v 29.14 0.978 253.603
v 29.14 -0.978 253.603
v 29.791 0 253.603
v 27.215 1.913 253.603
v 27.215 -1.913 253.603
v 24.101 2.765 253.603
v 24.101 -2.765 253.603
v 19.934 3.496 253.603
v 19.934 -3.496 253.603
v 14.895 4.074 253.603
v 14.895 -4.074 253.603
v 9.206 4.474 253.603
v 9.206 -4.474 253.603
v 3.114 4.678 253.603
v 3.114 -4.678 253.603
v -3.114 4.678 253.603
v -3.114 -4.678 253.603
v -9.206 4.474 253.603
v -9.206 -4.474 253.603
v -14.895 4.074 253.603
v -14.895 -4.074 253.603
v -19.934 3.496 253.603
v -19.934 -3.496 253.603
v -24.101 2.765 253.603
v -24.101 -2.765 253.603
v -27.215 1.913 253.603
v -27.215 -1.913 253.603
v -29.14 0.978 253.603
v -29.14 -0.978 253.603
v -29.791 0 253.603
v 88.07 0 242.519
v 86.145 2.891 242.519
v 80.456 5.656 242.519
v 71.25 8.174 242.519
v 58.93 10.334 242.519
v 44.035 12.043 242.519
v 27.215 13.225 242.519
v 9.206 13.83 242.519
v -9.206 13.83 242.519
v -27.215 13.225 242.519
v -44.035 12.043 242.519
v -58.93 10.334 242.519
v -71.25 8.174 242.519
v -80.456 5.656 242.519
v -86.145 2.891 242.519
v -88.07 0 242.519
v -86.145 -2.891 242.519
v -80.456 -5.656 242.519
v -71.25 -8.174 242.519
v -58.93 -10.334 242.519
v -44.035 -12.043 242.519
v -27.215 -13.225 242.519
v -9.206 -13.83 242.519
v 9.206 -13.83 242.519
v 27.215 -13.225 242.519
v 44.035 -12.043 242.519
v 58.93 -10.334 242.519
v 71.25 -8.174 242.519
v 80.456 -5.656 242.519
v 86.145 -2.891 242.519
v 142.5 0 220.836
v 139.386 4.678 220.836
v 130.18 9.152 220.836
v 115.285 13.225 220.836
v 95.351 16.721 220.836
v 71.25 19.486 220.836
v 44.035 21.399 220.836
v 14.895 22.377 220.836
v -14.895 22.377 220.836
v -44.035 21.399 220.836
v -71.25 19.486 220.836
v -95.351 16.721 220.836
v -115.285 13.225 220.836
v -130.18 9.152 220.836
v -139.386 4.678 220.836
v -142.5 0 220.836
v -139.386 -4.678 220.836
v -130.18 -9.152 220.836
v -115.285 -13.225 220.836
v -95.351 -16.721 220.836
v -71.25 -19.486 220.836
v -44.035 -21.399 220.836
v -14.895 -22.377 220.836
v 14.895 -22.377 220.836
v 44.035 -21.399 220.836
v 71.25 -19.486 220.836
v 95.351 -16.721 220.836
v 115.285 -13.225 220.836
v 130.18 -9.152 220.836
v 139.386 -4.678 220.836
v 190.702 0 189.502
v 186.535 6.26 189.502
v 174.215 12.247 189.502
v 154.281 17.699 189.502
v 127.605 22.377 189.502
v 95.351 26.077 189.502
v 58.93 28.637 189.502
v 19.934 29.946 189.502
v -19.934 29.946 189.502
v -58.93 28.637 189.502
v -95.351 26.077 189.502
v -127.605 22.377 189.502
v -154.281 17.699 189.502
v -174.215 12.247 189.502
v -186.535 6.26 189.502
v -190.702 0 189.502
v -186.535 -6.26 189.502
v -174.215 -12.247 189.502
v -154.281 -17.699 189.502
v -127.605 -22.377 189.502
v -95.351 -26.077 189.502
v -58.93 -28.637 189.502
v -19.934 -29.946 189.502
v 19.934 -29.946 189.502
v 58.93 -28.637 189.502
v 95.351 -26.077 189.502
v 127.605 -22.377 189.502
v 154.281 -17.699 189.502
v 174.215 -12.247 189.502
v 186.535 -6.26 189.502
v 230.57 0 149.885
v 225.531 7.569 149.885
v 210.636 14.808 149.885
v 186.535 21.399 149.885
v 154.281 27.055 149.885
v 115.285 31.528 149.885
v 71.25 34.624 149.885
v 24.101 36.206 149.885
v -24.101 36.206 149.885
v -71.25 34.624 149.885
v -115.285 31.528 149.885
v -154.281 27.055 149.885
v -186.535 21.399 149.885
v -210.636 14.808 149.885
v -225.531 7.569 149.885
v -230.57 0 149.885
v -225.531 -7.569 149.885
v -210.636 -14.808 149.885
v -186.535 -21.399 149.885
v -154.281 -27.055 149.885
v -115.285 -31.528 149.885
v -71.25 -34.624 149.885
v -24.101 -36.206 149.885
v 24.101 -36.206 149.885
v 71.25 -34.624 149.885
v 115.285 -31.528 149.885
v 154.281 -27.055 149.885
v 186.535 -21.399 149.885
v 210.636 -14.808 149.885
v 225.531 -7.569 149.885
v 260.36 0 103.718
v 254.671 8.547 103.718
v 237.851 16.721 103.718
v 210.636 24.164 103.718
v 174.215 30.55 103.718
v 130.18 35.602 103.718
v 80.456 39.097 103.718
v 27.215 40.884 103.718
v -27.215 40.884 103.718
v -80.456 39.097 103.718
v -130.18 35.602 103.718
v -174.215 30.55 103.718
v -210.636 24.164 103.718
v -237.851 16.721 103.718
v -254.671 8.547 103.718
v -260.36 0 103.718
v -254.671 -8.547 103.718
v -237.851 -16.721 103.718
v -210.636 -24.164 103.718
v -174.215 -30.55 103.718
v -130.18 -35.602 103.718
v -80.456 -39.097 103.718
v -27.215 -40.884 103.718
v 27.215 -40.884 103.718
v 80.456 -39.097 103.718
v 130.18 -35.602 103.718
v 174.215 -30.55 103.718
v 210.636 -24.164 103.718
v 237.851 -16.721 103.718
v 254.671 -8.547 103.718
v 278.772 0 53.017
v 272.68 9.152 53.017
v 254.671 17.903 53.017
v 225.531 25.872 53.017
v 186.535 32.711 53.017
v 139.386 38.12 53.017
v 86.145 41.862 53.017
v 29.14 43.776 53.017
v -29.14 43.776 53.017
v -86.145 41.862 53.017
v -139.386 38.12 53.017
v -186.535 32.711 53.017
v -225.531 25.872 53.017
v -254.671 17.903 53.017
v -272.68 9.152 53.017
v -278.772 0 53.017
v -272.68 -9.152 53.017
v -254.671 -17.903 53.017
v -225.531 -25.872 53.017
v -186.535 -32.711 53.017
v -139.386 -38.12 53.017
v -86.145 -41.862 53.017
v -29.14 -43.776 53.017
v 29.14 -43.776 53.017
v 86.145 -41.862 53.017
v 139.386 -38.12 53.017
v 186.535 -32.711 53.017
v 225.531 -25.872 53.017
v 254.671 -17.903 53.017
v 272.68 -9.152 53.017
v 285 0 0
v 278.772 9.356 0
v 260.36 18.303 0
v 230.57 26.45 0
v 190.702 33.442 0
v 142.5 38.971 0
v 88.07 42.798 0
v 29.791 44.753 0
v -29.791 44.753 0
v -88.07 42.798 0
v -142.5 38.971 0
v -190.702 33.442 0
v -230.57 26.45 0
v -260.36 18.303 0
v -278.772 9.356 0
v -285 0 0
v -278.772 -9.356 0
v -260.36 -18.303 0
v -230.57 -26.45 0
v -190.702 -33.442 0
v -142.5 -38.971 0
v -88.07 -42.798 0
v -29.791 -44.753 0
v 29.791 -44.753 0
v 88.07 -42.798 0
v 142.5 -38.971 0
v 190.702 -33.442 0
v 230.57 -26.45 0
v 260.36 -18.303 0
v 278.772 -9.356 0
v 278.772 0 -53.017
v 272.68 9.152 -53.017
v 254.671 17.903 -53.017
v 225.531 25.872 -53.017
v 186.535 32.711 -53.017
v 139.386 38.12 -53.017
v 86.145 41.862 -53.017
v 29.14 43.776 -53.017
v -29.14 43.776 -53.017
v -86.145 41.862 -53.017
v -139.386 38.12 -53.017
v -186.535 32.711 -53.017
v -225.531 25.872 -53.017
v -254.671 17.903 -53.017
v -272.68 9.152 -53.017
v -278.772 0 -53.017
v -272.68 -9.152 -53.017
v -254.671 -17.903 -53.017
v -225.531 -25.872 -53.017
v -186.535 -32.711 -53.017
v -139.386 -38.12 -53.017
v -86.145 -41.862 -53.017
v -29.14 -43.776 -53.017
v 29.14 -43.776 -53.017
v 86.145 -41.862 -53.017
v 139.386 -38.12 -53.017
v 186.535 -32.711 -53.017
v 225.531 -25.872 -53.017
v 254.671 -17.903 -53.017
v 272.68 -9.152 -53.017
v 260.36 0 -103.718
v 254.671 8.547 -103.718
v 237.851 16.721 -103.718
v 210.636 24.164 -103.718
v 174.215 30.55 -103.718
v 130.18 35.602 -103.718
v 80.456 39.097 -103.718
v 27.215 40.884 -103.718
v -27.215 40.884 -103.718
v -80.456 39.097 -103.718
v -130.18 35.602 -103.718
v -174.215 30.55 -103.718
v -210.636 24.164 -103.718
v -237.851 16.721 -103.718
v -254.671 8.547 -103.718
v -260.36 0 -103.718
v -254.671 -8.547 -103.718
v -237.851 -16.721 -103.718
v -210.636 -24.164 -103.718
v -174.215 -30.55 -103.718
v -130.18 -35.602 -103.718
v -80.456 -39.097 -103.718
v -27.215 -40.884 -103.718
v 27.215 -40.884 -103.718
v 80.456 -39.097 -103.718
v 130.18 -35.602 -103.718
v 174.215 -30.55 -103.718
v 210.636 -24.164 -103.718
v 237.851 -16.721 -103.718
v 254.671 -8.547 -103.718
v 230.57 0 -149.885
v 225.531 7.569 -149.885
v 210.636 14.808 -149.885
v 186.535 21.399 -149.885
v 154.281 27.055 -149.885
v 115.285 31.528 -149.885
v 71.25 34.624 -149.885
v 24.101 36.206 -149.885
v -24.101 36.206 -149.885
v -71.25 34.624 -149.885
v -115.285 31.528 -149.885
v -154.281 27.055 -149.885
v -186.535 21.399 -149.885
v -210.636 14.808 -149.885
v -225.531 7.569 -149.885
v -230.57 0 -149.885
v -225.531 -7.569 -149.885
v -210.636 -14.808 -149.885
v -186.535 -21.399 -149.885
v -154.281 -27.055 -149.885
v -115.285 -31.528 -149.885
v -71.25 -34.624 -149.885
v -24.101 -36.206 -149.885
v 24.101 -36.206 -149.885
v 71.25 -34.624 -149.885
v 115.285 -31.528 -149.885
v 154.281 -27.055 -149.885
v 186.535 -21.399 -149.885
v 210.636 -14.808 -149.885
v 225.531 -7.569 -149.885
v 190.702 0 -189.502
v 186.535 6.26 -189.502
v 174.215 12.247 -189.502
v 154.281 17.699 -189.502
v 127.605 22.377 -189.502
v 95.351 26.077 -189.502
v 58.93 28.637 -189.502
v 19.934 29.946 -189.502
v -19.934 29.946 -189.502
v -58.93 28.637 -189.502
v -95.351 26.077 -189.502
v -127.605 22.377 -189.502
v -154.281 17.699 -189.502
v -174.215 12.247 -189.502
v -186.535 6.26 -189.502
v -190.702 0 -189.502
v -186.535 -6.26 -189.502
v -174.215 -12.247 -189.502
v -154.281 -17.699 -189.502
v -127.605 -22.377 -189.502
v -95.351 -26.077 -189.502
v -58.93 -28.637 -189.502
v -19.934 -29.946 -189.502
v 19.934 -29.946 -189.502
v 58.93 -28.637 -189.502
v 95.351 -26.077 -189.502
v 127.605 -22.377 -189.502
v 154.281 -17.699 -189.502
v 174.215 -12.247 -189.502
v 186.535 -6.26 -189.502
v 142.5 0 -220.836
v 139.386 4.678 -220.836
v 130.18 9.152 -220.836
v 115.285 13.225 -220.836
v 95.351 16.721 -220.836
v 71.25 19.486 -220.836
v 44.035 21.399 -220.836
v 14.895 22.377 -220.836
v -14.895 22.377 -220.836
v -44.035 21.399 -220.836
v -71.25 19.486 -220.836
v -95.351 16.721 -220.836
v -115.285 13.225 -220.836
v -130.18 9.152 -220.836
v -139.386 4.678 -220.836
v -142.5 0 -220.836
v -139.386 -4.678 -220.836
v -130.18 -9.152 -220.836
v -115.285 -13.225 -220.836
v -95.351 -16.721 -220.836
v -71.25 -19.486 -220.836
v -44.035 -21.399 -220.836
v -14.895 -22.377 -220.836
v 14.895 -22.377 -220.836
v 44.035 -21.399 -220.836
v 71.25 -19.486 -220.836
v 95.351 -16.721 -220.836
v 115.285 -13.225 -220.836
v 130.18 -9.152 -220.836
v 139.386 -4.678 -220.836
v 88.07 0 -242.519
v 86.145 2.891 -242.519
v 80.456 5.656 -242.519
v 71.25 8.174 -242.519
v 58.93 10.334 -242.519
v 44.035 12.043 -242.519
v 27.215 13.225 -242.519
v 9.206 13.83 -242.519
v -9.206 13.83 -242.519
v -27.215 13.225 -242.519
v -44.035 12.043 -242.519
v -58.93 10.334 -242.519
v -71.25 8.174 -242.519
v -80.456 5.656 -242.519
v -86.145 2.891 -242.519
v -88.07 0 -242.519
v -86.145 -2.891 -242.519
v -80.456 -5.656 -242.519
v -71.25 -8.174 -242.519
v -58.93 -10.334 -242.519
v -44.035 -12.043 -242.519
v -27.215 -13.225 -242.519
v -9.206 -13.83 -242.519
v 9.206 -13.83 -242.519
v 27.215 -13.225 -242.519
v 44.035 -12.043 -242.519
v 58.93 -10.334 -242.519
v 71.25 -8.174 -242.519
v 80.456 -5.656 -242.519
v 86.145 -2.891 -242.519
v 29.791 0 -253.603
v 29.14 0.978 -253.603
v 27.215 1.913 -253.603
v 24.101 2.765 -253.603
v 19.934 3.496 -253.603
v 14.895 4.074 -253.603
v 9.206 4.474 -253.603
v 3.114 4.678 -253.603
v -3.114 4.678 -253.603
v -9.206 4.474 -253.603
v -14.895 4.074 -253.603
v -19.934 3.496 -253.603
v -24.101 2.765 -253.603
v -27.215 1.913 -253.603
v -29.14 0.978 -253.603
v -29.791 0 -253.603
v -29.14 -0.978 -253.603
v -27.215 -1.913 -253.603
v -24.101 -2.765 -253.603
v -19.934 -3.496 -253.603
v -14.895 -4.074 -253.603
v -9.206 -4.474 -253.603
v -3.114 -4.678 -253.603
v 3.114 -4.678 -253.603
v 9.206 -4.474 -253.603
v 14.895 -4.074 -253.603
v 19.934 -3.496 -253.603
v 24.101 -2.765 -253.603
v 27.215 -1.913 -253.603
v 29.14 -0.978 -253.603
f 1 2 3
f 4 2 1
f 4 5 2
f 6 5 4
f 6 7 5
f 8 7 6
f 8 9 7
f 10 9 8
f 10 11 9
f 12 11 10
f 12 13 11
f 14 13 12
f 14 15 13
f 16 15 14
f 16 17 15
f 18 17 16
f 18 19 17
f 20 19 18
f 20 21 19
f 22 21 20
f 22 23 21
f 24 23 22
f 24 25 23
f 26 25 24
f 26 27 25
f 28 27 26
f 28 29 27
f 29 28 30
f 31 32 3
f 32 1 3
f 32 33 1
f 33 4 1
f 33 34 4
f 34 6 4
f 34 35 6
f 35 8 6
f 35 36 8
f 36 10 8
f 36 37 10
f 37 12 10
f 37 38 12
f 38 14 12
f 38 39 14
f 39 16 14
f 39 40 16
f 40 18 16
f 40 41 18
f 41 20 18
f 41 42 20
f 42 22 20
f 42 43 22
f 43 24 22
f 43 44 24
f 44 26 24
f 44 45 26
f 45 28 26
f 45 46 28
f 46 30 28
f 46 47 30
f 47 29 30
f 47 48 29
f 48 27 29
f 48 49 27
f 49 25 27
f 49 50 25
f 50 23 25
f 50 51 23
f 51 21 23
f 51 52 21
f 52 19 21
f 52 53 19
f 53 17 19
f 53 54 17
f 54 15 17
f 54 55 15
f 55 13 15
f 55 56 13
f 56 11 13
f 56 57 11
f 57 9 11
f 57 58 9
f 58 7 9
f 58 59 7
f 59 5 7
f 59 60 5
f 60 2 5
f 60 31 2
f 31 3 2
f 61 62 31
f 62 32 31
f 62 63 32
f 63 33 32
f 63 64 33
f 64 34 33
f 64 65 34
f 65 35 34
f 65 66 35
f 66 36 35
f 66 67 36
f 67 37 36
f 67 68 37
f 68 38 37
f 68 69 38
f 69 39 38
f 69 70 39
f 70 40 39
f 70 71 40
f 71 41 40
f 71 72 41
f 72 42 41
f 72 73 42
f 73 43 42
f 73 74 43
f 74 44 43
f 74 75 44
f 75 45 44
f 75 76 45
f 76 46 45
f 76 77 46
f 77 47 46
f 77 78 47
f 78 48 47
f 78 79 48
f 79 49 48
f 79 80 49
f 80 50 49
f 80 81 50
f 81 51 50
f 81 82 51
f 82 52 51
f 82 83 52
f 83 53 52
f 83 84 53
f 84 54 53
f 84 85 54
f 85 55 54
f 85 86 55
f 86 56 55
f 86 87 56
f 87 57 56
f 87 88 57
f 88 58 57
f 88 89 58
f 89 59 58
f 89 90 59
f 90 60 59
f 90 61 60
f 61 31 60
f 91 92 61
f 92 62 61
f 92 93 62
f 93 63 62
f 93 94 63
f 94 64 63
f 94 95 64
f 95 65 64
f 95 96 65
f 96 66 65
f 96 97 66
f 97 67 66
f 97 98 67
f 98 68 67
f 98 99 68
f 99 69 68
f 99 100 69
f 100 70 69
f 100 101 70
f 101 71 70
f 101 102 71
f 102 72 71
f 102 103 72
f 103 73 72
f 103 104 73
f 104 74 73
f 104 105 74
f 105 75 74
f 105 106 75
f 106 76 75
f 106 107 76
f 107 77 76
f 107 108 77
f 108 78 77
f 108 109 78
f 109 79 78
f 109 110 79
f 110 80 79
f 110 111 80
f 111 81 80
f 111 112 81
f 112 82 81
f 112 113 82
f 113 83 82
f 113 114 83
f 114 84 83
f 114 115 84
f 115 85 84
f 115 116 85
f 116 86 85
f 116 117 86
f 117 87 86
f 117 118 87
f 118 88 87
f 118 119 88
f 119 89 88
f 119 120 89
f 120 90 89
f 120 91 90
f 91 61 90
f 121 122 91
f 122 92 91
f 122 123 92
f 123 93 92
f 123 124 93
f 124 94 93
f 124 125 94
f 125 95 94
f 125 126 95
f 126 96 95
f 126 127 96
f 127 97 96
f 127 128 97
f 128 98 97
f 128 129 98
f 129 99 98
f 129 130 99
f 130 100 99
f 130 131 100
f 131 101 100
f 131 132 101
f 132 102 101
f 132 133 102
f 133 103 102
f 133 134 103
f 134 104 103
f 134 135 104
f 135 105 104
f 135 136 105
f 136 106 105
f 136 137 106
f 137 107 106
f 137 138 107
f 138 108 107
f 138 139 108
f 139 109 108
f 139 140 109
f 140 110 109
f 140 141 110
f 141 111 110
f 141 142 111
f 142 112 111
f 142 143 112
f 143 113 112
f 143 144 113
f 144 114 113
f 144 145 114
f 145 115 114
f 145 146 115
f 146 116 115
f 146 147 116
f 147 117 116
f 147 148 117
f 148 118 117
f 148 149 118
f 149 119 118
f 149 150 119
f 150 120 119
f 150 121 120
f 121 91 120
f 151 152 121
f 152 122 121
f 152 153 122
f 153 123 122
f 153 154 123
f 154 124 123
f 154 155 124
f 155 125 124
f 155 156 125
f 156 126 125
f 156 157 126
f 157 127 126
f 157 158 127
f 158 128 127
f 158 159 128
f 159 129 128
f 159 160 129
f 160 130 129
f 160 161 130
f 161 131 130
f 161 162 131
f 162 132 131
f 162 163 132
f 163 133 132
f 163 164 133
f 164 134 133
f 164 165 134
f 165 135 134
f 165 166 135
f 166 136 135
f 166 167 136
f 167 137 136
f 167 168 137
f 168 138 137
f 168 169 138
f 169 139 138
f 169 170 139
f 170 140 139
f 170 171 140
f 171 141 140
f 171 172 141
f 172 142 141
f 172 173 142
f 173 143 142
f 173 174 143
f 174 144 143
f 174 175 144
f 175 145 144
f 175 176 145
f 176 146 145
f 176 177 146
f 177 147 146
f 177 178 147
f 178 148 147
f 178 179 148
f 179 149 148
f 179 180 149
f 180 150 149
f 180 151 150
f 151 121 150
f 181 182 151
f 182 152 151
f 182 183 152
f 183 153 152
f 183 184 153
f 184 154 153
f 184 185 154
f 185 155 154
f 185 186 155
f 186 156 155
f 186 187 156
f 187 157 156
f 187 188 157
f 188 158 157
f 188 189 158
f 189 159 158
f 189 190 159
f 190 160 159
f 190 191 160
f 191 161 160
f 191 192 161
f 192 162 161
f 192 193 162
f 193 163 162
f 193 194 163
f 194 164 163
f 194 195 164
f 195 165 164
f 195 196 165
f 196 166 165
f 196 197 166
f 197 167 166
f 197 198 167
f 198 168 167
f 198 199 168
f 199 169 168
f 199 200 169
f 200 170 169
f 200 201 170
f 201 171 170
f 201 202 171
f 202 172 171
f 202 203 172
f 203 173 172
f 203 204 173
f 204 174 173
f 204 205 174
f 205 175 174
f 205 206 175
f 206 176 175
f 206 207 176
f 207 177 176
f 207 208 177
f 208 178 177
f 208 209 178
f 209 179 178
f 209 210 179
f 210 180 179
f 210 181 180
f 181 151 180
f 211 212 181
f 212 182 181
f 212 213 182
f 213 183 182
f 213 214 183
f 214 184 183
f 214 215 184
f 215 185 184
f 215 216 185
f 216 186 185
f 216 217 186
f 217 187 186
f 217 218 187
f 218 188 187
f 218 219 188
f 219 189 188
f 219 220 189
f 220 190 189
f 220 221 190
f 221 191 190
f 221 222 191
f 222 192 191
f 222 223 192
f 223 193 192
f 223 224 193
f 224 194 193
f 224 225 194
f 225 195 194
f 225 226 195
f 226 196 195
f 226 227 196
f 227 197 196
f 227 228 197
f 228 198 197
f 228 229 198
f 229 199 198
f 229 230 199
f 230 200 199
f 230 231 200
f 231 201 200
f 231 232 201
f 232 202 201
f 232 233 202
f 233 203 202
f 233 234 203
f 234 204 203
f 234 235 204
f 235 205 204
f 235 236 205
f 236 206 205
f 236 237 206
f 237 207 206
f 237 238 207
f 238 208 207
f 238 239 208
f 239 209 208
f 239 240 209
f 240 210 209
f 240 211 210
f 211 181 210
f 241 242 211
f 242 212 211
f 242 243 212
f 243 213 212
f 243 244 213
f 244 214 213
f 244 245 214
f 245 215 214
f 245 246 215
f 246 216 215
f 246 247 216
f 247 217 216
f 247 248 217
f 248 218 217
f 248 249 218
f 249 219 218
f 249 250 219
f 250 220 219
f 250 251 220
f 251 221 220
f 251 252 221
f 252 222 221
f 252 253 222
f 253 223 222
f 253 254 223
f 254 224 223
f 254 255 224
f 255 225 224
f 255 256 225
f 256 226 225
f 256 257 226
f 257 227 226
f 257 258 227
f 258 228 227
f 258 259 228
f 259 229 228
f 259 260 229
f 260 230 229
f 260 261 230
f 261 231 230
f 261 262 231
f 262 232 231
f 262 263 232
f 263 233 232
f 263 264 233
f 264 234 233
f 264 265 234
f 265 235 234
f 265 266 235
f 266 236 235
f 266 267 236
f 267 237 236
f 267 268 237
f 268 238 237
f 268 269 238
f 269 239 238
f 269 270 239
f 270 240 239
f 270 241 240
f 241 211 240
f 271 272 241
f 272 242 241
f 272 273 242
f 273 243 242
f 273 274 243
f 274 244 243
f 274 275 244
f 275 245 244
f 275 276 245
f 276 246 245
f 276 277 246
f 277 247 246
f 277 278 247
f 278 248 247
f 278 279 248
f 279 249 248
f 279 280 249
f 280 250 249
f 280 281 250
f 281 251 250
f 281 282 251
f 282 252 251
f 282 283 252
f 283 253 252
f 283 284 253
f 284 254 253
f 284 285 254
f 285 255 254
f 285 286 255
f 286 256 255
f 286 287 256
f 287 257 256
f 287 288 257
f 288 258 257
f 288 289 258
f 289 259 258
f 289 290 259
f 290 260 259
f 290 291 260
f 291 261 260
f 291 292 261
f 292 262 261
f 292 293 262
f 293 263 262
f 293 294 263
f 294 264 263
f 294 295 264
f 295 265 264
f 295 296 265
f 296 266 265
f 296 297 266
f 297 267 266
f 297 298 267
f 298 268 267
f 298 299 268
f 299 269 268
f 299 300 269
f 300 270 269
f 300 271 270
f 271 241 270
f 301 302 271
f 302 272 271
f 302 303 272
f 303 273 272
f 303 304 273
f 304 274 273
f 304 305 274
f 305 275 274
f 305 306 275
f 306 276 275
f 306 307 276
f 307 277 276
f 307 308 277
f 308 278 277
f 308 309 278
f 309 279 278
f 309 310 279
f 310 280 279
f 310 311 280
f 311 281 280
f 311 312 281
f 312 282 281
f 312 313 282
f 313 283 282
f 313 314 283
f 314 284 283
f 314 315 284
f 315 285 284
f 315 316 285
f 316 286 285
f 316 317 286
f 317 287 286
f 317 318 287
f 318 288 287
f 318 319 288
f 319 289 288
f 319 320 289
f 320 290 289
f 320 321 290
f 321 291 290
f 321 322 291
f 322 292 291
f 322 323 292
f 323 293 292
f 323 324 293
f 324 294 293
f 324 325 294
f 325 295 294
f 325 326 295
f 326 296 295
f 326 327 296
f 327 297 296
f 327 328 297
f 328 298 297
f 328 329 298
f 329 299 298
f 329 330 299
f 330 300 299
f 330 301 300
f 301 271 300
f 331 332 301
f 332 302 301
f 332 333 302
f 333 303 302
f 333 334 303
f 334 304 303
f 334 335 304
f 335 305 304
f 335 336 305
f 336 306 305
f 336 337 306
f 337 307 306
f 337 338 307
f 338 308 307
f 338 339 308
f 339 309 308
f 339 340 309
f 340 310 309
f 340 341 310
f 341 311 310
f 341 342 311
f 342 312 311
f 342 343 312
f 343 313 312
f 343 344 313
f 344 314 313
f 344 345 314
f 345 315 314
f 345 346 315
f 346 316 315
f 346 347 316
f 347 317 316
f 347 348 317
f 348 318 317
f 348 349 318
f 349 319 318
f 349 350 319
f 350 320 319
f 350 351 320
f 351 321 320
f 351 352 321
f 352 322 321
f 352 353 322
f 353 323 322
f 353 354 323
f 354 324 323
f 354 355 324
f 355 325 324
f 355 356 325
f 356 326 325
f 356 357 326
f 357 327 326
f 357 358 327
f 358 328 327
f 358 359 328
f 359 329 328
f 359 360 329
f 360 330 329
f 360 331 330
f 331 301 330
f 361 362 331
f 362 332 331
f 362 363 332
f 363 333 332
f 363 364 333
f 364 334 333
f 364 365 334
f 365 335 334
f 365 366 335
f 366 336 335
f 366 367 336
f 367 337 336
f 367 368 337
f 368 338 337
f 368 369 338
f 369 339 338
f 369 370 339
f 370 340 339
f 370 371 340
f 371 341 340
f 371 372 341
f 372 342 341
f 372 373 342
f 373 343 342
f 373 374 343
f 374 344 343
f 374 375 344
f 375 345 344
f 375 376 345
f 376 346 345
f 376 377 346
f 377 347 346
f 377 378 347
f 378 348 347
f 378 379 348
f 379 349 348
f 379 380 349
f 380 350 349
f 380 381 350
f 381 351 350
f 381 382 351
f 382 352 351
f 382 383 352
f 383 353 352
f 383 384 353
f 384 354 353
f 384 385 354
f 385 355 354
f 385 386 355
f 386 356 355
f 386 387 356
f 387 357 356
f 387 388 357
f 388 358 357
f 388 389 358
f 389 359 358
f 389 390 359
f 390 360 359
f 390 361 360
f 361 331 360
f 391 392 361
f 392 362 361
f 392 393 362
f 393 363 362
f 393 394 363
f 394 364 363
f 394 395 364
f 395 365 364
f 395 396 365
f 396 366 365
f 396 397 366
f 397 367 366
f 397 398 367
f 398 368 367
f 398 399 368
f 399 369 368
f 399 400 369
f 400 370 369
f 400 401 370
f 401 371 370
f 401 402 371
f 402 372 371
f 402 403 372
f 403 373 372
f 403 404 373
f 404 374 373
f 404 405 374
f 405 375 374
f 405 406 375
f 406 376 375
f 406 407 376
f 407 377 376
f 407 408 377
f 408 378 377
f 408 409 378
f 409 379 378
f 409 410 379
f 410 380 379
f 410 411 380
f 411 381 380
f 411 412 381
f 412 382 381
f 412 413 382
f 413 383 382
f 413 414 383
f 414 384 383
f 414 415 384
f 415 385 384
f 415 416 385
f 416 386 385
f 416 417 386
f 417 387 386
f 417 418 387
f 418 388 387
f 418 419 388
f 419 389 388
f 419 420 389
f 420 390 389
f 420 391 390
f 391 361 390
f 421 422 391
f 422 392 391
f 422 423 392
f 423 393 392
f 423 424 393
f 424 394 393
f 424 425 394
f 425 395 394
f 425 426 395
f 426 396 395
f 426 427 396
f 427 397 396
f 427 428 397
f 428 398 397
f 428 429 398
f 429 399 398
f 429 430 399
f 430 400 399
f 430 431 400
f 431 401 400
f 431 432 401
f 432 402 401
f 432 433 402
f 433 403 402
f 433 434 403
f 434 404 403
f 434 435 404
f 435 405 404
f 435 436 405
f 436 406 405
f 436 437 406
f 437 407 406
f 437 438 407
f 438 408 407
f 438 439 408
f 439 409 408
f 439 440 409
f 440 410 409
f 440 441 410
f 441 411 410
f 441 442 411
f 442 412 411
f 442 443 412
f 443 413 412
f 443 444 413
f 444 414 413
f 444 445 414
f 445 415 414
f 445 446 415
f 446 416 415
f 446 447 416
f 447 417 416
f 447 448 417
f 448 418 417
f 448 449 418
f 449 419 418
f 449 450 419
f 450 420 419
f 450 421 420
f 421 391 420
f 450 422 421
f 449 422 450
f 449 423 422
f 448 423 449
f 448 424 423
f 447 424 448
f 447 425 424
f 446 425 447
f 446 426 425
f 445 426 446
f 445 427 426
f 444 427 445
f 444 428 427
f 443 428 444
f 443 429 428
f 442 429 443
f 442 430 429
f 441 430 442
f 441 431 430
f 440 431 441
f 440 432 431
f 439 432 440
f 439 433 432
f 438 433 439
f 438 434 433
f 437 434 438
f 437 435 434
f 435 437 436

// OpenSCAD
// Generated by SolidPython 1.0.1 on 2020-07-29 00:46:53


scale(v = [19, 3, 17]) {
	sphere(r = 15);
}
/***********************************************
*********      SolidPython code:      **********
************************************************
 
# import packages: SolidPython
from solid import *
from solid.utils import *
from itertools import chain, combinations, permutations


class Resize:

    def __init__(self, scad_file):
        self.scad_file = scad_file
        #self.scad_file = import_scad(scad_file)
        # cone/cylinder param:
        self.r1 = 0
        self.r2 = 0
        self.h = 0
        # rectangular prism param:
        self.w = 0
        self.l = 0
        # ellipse param:
        self.r = 0

    # import OpenScad code (file name corresponds to shape)


    # classify shape + parameters
    def assign(self, param1, param2, param3):
        if self.scad_file == 'cone.scad':
            self.r1 = param1
            self.r2 = param2
            self.h = param3
        elif self.scad_file == 'cylinder.scad':
            self.r1 = param1
            self.r2 = param2
            self.h = param3
        elif self.scad_file == 'rectangularPrism.scad':
            self.h = param1
            self.l = param2
            self.w = param3
        else:
            self.r = param1
            self.h = param2

    # resize parameters
    def iterate(self):
        x = range(3, 20, 2)
        i = 1
        if self.scad_file == 'cone.scad':
            tempList = list(permutations(x, 2))
            for temp in tempList:
                param1 = temp[0]
                param2 = temp[1]
                filepath = 'produced_scad_files/' + 'cone' + str(param1) + '_' + str(param2) + '_' + '.scad'
                scad_render_to_file(cylinder(h=param1, r1=param2, r2=0), filepath)

        elif self.scad_file == 'cylinder.scad':
            tempList = list(permutations(x, 3))
            for temp in tempList:
                param1 = temp[0]
                param2 = temp[1]
                filepath = 'produced_scad_files/' + 'cylinder' + str(param1) + '_' + str(param2) + '_' + '.scad'
                scad_render_to_file(cylinder(h=param1, r1=param2, r2=param2), filepath)

        elif self.scad_file == 'rectangularPrism.scad':
            tempList = list(permutations(x, 3))
            for temp in tempList:
                param1 = temp[0]
                param2 = temp[1]
                param3 = temp[2]
                filepath = 'produced_scad_files/' + 'rectangularPrism' + str(param1) + '_' + str(param2) + '_' + str(
                    param3) + '.scad'
                scad_render_to_file(cube(size=(param1, param2, param3)), filepath)

        elif self.scad_file == 'ellipse.scad':
            tempList = list(permutations(x, 4))
            for temp in tempList:
                param1 = temp[0]
                param2 = temp[1]
                param3 = temp[2]
                param4 = temp[3]
                filepath = 'produced_scad_files/' + 'ellipse' + str(param1) + '_' + str(param2) + '_' + str(param3) + '_' + str(param4) + '.scad'
                scad_render_to_file(scale([param1, param2, param3])(sphere(r=param4)), filepath)

    def render_to_scadfile(self):
        scad_render_to_file(scad, 'example.scad') 
 
************************************************/
